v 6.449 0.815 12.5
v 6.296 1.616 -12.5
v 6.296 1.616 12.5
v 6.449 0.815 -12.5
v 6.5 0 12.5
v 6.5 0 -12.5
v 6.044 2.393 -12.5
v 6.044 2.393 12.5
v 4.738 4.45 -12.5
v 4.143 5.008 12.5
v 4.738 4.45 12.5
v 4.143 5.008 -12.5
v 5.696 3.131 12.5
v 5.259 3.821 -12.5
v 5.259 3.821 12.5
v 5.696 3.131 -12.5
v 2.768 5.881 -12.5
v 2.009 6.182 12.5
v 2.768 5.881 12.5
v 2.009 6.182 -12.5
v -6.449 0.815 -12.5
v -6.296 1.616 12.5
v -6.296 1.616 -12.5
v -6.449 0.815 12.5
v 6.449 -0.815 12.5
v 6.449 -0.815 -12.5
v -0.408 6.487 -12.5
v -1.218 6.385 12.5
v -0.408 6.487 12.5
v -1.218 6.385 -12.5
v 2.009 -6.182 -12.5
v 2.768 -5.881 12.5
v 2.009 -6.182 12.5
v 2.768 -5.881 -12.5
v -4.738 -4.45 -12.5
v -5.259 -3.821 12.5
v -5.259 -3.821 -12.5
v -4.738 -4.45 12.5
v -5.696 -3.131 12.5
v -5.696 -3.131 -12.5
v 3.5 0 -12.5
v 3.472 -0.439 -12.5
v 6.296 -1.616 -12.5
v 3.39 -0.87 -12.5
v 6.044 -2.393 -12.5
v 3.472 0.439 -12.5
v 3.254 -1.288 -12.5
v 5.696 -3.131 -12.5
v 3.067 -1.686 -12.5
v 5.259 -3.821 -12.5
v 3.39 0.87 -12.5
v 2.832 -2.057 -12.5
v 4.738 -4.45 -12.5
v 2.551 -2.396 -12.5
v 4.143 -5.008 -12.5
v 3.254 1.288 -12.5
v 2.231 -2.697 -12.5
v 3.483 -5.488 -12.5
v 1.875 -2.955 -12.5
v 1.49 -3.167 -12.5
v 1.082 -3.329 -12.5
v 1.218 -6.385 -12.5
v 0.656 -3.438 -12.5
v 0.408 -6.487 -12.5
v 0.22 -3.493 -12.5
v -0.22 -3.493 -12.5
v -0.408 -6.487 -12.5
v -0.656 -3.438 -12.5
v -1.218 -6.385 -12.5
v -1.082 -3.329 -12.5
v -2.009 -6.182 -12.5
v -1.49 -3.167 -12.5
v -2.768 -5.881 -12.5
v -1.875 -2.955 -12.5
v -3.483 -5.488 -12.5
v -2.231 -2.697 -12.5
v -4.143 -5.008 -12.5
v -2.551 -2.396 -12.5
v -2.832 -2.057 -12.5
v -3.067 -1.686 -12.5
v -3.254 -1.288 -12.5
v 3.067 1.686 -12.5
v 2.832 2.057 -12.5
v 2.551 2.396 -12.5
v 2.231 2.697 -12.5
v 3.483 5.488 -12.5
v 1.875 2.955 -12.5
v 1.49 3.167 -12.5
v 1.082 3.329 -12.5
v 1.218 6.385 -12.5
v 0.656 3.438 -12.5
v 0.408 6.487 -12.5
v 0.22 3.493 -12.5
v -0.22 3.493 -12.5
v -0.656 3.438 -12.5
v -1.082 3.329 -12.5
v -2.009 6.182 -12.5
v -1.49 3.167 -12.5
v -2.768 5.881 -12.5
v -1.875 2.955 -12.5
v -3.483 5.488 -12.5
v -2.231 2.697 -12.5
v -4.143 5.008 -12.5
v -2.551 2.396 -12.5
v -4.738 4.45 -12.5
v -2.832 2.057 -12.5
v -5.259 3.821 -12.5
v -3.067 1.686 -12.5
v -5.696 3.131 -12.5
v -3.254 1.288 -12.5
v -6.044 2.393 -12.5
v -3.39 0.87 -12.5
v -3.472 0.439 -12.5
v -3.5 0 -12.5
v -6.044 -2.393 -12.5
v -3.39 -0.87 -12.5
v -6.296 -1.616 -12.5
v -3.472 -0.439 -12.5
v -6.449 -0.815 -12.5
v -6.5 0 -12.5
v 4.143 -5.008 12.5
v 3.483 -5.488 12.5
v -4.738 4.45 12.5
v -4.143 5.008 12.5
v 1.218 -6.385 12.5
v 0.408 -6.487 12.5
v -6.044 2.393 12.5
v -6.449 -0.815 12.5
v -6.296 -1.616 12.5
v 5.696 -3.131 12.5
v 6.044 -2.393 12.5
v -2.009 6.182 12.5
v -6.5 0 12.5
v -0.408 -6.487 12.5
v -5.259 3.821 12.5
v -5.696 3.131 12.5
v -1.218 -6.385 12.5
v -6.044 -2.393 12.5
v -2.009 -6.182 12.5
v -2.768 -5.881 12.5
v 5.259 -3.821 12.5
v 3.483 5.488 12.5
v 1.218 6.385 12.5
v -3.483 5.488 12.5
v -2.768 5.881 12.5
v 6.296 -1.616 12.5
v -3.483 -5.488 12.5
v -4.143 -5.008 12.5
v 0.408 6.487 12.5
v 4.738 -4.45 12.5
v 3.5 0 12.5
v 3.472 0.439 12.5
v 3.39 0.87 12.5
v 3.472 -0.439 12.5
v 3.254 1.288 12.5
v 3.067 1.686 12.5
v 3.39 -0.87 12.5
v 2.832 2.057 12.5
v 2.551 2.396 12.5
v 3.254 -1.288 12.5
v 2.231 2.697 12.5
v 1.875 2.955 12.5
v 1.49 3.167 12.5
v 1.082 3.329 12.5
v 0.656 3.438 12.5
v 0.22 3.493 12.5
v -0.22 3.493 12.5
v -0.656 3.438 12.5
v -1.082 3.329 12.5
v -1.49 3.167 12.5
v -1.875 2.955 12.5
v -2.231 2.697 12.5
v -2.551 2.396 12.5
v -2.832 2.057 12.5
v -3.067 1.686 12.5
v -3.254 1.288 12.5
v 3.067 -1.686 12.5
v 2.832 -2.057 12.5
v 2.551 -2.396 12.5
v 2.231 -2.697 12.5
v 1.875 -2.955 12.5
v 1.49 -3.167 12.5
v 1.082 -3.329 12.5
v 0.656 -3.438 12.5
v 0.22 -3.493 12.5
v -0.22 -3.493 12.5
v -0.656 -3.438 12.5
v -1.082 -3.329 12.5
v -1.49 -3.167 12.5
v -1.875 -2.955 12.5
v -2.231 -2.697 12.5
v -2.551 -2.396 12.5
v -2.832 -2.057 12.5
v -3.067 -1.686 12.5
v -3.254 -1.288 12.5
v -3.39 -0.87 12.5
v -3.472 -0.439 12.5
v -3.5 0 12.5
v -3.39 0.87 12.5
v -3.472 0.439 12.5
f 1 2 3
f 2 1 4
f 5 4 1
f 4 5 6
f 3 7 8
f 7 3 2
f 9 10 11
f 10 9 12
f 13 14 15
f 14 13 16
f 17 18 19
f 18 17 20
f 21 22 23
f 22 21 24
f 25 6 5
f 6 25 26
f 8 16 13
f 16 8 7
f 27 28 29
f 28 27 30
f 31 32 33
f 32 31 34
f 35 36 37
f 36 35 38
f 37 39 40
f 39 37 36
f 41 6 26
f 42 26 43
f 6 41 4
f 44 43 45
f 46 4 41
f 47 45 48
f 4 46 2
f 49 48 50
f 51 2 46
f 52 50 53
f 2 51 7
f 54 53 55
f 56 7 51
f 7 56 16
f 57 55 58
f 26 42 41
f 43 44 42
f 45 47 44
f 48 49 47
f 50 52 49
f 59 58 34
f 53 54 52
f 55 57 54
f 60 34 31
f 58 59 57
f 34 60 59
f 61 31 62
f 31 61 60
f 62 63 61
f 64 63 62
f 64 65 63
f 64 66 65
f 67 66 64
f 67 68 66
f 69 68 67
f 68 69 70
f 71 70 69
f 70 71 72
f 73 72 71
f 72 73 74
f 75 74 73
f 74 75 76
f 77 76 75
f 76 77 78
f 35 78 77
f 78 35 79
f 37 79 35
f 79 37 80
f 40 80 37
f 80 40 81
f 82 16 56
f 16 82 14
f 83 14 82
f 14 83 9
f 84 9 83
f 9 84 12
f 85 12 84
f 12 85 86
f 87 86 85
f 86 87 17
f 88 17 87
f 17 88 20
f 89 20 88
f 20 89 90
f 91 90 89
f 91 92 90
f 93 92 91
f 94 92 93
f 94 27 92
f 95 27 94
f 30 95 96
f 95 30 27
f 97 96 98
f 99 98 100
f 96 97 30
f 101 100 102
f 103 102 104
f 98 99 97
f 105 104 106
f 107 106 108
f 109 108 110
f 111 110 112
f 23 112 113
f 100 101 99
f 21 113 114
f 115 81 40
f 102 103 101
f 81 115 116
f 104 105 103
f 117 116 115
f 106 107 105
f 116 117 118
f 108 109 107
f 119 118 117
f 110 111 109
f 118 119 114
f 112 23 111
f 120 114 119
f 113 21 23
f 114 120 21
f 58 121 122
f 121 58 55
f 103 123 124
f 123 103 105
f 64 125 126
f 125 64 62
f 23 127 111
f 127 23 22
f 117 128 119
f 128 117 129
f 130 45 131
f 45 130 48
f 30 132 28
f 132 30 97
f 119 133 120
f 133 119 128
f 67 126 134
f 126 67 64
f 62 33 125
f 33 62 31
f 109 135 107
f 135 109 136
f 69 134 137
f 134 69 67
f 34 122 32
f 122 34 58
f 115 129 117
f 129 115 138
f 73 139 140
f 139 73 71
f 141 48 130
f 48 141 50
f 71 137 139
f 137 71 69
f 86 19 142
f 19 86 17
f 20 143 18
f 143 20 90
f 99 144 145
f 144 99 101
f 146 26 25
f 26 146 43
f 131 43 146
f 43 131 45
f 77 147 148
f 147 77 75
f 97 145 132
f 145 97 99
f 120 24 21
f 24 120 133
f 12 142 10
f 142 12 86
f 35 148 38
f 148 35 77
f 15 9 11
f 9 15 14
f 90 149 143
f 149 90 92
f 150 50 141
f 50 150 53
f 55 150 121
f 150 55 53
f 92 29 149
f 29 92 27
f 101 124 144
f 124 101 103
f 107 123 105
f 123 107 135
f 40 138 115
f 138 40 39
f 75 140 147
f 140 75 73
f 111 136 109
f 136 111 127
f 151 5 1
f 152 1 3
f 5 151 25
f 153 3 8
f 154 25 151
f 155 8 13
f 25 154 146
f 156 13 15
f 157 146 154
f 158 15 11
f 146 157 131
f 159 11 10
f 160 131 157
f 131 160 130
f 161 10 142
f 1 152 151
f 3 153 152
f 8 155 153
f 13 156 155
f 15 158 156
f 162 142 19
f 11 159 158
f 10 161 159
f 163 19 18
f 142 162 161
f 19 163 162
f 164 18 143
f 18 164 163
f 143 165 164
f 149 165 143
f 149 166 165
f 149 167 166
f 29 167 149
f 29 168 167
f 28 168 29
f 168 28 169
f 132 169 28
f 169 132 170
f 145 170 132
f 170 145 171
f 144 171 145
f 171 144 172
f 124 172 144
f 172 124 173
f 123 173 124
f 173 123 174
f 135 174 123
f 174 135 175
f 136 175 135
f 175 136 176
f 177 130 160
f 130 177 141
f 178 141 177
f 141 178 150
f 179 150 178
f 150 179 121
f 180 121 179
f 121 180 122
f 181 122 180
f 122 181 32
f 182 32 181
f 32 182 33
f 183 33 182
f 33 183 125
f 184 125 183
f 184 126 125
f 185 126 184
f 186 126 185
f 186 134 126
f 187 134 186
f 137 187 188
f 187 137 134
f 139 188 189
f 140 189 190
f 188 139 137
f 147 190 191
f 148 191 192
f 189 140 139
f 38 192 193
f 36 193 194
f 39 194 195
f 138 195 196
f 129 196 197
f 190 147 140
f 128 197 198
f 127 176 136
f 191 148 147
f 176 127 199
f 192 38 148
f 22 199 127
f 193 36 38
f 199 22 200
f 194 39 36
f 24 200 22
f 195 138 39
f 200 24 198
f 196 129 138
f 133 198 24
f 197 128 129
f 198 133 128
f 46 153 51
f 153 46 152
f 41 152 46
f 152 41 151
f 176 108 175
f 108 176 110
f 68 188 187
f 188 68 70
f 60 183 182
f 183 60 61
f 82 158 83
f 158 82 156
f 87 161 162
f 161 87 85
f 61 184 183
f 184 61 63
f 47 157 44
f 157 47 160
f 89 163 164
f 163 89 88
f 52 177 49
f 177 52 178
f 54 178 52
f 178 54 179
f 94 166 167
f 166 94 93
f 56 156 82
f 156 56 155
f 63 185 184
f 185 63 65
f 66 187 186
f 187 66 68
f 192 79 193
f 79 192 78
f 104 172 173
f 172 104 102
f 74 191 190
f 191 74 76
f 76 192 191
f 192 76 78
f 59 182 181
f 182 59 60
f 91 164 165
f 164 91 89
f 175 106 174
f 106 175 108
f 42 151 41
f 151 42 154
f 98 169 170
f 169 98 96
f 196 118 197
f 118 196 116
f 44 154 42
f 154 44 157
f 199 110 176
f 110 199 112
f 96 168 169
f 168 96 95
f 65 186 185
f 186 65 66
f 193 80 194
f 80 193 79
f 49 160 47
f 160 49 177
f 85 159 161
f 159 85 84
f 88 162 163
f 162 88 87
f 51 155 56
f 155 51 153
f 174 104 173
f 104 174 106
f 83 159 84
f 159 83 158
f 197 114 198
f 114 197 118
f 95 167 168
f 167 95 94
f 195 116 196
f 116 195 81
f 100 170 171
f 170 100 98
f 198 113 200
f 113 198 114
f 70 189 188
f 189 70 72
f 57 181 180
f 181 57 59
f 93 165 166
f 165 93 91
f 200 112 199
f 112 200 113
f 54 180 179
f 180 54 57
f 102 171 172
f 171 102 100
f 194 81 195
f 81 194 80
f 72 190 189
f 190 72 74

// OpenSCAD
$fn = 50;


difference() {
	union() {
		translate(v = [0, 0, -12.5000000000]) {
			cylinder(h = 25, r = 6.5000000000);
		}
	}
	union() {
		translate(v = [0, 0, -100.0000000000]) {
			cylinder(h = 200, r = 3.5000000000);
		}
	}
}
